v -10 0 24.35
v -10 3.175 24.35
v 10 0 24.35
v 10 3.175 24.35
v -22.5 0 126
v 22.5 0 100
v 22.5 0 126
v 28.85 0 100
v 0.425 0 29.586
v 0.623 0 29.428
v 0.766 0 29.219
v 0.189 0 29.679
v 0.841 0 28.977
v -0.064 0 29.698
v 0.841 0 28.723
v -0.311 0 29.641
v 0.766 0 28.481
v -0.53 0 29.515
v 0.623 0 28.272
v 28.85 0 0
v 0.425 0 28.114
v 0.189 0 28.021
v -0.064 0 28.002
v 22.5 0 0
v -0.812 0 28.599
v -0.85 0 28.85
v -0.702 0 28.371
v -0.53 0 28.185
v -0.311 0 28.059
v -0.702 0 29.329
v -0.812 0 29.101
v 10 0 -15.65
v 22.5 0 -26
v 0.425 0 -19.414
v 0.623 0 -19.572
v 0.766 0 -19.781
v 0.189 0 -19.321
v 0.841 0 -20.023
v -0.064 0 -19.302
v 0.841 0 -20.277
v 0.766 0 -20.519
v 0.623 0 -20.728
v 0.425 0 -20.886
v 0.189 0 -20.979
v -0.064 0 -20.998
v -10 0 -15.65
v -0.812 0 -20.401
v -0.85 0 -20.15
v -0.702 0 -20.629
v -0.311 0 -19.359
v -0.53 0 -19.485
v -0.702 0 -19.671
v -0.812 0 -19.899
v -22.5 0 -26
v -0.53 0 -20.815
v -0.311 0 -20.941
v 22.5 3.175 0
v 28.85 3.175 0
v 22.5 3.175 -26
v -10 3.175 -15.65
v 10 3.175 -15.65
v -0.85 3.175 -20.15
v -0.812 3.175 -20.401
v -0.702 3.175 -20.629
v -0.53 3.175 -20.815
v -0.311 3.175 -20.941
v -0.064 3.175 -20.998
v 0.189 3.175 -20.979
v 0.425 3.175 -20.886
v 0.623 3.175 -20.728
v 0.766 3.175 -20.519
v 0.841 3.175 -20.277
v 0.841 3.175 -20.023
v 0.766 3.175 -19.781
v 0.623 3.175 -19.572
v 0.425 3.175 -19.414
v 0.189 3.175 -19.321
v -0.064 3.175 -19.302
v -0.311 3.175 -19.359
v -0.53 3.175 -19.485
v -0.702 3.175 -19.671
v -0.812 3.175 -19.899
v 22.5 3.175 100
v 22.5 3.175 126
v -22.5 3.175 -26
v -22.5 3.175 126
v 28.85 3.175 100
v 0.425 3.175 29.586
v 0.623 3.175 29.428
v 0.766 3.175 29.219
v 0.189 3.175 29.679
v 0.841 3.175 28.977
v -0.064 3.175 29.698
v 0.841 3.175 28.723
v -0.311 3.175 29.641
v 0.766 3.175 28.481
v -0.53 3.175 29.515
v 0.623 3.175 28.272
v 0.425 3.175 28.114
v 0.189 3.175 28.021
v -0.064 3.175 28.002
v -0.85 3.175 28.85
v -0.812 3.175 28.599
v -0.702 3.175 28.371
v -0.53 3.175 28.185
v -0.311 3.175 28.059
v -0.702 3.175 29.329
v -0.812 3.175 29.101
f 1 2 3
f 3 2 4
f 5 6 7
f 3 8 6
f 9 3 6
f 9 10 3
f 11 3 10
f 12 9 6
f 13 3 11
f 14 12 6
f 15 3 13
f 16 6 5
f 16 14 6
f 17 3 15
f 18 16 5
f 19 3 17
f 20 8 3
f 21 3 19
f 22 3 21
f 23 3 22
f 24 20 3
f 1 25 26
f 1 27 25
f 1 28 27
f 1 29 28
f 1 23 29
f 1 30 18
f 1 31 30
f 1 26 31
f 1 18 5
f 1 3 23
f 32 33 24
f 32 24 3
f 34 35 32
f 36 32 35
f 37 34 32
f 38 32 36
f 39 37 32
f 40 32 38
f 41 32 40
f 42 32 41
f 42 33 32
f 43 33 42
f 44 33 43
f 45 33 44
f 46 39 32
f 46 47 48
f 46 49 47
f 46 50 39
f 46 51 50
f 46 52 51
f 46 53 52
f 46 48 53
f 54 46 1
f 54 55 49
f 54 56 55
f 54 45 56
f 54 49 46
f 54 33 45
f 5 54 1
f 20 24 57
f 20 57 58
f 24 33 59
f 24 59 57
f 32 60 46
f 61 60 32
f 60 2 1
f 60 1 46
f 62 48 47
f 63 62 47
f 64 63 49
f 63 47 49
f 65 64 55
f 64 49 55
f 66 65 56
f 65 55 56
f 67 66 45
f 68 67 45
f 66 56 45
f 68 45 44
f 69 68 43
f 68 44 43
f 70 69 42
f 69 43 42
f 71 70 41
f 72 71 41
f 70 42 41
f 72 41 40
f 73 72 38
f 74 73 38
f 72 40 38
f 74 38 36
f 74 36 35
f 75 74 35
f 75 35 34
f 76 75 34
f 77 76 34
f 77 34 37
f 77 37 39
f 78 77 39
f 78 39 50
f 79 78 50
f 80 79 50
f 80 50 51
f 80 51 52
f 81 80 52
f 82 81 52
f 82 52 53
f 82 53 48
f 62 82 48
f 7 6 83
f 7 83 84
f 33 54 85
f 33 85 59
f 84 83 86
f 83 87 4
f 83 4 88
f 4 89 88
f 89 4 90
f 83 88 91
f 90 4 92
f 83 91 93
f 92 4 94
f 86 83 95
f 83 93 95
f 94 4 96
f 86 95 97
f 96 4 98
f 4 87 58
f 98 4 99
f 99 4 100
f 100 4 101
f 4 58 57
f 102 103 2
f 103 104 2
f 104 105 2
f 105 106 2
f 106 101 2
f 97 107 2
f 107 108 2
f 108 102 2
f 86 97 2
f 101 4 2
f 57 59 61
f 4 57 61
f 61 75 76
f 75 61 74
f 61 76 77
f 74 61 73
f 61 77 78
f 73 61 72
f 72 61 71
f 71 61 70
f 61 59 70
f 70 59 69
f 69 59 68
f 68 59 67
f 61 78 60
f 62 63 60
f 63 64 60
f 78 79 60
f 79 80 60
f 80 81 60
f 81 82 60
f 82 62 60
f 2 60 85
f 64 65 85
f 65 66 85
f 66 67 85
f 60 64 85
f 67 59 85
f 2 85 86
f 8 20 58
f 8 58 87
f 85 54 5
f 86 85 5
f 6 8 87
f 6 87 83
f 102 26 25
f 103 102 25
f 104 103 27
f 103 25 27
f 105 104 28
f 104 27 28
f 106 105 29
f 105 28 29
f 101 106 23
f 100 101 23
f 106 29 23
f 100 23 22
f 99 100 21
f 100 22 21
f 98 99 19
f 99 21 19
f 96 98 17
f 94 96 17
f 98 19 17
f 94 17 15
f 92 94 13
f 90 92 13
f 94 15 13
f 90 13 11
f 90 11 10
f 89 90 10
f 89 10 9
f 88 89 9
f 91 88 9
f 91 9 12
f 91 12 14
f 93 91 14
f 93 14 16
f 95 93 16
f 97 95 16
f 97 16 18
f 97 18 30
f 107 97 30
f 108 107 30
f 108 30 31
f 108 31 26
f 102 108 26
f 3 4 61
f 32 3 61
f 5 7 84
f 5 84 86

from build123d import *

# Parameters (mm, degrees)
BOSS_EXTRUDE1_DEPTH    = 3.175
SKETCH2_W              = 20
SKETCH2_H              = 40
CUT_EXTRUDE1_DEPTH     = 130.299664056
M1_6_CLEARANCE_HOLE1_D = 1.7


with BuildPart() as part:
    # Sketch1 → Boss-Extrude1 (new body)
    with BuildSketch(Plane(origin=(0, 0, 0), x_dir=(1, 0, 0), z_dir=(0, 1, 0))):
        Polygon((-22.5, 0), (-22.5, 26), (22.5, 26), (22.5, 0), (28.85, 0), (28.85, -100), (22.5, -100), (22.5, -126), (-22.5, -126), (-22.5, -100), align=None)
    extrude(amount=BOSS_EXTRUDE1_DEPTH)

    # Sketch2 → Cut-Extrude1 (cut, through all)
    with BuildSketch(Plane(origin=(0, 3.175, 0), x_dir=(1, 0, 0), z_dir=(0, 1, 0))):
        with Locations((0, -4.35)):
            Rectangle(SKETCH2_W, SKETCH2_H)
    extrude(amount=-CUT_EXTRUDE1_DEPTH, mode=Mode.SUBTRACT)

    # M1.6 Clearance Hole1 (through all)
    with Locations(Plane(origin=(0, 3.175, 0), x_dir=(1, 0, 0), z_dir=(0, 1, 0))):
        with Locations((0, -28.85), (0, 20.15)):
            Hole(M1_6_CLEARANCE_HOLE1_D / 2)


solid = part.part
